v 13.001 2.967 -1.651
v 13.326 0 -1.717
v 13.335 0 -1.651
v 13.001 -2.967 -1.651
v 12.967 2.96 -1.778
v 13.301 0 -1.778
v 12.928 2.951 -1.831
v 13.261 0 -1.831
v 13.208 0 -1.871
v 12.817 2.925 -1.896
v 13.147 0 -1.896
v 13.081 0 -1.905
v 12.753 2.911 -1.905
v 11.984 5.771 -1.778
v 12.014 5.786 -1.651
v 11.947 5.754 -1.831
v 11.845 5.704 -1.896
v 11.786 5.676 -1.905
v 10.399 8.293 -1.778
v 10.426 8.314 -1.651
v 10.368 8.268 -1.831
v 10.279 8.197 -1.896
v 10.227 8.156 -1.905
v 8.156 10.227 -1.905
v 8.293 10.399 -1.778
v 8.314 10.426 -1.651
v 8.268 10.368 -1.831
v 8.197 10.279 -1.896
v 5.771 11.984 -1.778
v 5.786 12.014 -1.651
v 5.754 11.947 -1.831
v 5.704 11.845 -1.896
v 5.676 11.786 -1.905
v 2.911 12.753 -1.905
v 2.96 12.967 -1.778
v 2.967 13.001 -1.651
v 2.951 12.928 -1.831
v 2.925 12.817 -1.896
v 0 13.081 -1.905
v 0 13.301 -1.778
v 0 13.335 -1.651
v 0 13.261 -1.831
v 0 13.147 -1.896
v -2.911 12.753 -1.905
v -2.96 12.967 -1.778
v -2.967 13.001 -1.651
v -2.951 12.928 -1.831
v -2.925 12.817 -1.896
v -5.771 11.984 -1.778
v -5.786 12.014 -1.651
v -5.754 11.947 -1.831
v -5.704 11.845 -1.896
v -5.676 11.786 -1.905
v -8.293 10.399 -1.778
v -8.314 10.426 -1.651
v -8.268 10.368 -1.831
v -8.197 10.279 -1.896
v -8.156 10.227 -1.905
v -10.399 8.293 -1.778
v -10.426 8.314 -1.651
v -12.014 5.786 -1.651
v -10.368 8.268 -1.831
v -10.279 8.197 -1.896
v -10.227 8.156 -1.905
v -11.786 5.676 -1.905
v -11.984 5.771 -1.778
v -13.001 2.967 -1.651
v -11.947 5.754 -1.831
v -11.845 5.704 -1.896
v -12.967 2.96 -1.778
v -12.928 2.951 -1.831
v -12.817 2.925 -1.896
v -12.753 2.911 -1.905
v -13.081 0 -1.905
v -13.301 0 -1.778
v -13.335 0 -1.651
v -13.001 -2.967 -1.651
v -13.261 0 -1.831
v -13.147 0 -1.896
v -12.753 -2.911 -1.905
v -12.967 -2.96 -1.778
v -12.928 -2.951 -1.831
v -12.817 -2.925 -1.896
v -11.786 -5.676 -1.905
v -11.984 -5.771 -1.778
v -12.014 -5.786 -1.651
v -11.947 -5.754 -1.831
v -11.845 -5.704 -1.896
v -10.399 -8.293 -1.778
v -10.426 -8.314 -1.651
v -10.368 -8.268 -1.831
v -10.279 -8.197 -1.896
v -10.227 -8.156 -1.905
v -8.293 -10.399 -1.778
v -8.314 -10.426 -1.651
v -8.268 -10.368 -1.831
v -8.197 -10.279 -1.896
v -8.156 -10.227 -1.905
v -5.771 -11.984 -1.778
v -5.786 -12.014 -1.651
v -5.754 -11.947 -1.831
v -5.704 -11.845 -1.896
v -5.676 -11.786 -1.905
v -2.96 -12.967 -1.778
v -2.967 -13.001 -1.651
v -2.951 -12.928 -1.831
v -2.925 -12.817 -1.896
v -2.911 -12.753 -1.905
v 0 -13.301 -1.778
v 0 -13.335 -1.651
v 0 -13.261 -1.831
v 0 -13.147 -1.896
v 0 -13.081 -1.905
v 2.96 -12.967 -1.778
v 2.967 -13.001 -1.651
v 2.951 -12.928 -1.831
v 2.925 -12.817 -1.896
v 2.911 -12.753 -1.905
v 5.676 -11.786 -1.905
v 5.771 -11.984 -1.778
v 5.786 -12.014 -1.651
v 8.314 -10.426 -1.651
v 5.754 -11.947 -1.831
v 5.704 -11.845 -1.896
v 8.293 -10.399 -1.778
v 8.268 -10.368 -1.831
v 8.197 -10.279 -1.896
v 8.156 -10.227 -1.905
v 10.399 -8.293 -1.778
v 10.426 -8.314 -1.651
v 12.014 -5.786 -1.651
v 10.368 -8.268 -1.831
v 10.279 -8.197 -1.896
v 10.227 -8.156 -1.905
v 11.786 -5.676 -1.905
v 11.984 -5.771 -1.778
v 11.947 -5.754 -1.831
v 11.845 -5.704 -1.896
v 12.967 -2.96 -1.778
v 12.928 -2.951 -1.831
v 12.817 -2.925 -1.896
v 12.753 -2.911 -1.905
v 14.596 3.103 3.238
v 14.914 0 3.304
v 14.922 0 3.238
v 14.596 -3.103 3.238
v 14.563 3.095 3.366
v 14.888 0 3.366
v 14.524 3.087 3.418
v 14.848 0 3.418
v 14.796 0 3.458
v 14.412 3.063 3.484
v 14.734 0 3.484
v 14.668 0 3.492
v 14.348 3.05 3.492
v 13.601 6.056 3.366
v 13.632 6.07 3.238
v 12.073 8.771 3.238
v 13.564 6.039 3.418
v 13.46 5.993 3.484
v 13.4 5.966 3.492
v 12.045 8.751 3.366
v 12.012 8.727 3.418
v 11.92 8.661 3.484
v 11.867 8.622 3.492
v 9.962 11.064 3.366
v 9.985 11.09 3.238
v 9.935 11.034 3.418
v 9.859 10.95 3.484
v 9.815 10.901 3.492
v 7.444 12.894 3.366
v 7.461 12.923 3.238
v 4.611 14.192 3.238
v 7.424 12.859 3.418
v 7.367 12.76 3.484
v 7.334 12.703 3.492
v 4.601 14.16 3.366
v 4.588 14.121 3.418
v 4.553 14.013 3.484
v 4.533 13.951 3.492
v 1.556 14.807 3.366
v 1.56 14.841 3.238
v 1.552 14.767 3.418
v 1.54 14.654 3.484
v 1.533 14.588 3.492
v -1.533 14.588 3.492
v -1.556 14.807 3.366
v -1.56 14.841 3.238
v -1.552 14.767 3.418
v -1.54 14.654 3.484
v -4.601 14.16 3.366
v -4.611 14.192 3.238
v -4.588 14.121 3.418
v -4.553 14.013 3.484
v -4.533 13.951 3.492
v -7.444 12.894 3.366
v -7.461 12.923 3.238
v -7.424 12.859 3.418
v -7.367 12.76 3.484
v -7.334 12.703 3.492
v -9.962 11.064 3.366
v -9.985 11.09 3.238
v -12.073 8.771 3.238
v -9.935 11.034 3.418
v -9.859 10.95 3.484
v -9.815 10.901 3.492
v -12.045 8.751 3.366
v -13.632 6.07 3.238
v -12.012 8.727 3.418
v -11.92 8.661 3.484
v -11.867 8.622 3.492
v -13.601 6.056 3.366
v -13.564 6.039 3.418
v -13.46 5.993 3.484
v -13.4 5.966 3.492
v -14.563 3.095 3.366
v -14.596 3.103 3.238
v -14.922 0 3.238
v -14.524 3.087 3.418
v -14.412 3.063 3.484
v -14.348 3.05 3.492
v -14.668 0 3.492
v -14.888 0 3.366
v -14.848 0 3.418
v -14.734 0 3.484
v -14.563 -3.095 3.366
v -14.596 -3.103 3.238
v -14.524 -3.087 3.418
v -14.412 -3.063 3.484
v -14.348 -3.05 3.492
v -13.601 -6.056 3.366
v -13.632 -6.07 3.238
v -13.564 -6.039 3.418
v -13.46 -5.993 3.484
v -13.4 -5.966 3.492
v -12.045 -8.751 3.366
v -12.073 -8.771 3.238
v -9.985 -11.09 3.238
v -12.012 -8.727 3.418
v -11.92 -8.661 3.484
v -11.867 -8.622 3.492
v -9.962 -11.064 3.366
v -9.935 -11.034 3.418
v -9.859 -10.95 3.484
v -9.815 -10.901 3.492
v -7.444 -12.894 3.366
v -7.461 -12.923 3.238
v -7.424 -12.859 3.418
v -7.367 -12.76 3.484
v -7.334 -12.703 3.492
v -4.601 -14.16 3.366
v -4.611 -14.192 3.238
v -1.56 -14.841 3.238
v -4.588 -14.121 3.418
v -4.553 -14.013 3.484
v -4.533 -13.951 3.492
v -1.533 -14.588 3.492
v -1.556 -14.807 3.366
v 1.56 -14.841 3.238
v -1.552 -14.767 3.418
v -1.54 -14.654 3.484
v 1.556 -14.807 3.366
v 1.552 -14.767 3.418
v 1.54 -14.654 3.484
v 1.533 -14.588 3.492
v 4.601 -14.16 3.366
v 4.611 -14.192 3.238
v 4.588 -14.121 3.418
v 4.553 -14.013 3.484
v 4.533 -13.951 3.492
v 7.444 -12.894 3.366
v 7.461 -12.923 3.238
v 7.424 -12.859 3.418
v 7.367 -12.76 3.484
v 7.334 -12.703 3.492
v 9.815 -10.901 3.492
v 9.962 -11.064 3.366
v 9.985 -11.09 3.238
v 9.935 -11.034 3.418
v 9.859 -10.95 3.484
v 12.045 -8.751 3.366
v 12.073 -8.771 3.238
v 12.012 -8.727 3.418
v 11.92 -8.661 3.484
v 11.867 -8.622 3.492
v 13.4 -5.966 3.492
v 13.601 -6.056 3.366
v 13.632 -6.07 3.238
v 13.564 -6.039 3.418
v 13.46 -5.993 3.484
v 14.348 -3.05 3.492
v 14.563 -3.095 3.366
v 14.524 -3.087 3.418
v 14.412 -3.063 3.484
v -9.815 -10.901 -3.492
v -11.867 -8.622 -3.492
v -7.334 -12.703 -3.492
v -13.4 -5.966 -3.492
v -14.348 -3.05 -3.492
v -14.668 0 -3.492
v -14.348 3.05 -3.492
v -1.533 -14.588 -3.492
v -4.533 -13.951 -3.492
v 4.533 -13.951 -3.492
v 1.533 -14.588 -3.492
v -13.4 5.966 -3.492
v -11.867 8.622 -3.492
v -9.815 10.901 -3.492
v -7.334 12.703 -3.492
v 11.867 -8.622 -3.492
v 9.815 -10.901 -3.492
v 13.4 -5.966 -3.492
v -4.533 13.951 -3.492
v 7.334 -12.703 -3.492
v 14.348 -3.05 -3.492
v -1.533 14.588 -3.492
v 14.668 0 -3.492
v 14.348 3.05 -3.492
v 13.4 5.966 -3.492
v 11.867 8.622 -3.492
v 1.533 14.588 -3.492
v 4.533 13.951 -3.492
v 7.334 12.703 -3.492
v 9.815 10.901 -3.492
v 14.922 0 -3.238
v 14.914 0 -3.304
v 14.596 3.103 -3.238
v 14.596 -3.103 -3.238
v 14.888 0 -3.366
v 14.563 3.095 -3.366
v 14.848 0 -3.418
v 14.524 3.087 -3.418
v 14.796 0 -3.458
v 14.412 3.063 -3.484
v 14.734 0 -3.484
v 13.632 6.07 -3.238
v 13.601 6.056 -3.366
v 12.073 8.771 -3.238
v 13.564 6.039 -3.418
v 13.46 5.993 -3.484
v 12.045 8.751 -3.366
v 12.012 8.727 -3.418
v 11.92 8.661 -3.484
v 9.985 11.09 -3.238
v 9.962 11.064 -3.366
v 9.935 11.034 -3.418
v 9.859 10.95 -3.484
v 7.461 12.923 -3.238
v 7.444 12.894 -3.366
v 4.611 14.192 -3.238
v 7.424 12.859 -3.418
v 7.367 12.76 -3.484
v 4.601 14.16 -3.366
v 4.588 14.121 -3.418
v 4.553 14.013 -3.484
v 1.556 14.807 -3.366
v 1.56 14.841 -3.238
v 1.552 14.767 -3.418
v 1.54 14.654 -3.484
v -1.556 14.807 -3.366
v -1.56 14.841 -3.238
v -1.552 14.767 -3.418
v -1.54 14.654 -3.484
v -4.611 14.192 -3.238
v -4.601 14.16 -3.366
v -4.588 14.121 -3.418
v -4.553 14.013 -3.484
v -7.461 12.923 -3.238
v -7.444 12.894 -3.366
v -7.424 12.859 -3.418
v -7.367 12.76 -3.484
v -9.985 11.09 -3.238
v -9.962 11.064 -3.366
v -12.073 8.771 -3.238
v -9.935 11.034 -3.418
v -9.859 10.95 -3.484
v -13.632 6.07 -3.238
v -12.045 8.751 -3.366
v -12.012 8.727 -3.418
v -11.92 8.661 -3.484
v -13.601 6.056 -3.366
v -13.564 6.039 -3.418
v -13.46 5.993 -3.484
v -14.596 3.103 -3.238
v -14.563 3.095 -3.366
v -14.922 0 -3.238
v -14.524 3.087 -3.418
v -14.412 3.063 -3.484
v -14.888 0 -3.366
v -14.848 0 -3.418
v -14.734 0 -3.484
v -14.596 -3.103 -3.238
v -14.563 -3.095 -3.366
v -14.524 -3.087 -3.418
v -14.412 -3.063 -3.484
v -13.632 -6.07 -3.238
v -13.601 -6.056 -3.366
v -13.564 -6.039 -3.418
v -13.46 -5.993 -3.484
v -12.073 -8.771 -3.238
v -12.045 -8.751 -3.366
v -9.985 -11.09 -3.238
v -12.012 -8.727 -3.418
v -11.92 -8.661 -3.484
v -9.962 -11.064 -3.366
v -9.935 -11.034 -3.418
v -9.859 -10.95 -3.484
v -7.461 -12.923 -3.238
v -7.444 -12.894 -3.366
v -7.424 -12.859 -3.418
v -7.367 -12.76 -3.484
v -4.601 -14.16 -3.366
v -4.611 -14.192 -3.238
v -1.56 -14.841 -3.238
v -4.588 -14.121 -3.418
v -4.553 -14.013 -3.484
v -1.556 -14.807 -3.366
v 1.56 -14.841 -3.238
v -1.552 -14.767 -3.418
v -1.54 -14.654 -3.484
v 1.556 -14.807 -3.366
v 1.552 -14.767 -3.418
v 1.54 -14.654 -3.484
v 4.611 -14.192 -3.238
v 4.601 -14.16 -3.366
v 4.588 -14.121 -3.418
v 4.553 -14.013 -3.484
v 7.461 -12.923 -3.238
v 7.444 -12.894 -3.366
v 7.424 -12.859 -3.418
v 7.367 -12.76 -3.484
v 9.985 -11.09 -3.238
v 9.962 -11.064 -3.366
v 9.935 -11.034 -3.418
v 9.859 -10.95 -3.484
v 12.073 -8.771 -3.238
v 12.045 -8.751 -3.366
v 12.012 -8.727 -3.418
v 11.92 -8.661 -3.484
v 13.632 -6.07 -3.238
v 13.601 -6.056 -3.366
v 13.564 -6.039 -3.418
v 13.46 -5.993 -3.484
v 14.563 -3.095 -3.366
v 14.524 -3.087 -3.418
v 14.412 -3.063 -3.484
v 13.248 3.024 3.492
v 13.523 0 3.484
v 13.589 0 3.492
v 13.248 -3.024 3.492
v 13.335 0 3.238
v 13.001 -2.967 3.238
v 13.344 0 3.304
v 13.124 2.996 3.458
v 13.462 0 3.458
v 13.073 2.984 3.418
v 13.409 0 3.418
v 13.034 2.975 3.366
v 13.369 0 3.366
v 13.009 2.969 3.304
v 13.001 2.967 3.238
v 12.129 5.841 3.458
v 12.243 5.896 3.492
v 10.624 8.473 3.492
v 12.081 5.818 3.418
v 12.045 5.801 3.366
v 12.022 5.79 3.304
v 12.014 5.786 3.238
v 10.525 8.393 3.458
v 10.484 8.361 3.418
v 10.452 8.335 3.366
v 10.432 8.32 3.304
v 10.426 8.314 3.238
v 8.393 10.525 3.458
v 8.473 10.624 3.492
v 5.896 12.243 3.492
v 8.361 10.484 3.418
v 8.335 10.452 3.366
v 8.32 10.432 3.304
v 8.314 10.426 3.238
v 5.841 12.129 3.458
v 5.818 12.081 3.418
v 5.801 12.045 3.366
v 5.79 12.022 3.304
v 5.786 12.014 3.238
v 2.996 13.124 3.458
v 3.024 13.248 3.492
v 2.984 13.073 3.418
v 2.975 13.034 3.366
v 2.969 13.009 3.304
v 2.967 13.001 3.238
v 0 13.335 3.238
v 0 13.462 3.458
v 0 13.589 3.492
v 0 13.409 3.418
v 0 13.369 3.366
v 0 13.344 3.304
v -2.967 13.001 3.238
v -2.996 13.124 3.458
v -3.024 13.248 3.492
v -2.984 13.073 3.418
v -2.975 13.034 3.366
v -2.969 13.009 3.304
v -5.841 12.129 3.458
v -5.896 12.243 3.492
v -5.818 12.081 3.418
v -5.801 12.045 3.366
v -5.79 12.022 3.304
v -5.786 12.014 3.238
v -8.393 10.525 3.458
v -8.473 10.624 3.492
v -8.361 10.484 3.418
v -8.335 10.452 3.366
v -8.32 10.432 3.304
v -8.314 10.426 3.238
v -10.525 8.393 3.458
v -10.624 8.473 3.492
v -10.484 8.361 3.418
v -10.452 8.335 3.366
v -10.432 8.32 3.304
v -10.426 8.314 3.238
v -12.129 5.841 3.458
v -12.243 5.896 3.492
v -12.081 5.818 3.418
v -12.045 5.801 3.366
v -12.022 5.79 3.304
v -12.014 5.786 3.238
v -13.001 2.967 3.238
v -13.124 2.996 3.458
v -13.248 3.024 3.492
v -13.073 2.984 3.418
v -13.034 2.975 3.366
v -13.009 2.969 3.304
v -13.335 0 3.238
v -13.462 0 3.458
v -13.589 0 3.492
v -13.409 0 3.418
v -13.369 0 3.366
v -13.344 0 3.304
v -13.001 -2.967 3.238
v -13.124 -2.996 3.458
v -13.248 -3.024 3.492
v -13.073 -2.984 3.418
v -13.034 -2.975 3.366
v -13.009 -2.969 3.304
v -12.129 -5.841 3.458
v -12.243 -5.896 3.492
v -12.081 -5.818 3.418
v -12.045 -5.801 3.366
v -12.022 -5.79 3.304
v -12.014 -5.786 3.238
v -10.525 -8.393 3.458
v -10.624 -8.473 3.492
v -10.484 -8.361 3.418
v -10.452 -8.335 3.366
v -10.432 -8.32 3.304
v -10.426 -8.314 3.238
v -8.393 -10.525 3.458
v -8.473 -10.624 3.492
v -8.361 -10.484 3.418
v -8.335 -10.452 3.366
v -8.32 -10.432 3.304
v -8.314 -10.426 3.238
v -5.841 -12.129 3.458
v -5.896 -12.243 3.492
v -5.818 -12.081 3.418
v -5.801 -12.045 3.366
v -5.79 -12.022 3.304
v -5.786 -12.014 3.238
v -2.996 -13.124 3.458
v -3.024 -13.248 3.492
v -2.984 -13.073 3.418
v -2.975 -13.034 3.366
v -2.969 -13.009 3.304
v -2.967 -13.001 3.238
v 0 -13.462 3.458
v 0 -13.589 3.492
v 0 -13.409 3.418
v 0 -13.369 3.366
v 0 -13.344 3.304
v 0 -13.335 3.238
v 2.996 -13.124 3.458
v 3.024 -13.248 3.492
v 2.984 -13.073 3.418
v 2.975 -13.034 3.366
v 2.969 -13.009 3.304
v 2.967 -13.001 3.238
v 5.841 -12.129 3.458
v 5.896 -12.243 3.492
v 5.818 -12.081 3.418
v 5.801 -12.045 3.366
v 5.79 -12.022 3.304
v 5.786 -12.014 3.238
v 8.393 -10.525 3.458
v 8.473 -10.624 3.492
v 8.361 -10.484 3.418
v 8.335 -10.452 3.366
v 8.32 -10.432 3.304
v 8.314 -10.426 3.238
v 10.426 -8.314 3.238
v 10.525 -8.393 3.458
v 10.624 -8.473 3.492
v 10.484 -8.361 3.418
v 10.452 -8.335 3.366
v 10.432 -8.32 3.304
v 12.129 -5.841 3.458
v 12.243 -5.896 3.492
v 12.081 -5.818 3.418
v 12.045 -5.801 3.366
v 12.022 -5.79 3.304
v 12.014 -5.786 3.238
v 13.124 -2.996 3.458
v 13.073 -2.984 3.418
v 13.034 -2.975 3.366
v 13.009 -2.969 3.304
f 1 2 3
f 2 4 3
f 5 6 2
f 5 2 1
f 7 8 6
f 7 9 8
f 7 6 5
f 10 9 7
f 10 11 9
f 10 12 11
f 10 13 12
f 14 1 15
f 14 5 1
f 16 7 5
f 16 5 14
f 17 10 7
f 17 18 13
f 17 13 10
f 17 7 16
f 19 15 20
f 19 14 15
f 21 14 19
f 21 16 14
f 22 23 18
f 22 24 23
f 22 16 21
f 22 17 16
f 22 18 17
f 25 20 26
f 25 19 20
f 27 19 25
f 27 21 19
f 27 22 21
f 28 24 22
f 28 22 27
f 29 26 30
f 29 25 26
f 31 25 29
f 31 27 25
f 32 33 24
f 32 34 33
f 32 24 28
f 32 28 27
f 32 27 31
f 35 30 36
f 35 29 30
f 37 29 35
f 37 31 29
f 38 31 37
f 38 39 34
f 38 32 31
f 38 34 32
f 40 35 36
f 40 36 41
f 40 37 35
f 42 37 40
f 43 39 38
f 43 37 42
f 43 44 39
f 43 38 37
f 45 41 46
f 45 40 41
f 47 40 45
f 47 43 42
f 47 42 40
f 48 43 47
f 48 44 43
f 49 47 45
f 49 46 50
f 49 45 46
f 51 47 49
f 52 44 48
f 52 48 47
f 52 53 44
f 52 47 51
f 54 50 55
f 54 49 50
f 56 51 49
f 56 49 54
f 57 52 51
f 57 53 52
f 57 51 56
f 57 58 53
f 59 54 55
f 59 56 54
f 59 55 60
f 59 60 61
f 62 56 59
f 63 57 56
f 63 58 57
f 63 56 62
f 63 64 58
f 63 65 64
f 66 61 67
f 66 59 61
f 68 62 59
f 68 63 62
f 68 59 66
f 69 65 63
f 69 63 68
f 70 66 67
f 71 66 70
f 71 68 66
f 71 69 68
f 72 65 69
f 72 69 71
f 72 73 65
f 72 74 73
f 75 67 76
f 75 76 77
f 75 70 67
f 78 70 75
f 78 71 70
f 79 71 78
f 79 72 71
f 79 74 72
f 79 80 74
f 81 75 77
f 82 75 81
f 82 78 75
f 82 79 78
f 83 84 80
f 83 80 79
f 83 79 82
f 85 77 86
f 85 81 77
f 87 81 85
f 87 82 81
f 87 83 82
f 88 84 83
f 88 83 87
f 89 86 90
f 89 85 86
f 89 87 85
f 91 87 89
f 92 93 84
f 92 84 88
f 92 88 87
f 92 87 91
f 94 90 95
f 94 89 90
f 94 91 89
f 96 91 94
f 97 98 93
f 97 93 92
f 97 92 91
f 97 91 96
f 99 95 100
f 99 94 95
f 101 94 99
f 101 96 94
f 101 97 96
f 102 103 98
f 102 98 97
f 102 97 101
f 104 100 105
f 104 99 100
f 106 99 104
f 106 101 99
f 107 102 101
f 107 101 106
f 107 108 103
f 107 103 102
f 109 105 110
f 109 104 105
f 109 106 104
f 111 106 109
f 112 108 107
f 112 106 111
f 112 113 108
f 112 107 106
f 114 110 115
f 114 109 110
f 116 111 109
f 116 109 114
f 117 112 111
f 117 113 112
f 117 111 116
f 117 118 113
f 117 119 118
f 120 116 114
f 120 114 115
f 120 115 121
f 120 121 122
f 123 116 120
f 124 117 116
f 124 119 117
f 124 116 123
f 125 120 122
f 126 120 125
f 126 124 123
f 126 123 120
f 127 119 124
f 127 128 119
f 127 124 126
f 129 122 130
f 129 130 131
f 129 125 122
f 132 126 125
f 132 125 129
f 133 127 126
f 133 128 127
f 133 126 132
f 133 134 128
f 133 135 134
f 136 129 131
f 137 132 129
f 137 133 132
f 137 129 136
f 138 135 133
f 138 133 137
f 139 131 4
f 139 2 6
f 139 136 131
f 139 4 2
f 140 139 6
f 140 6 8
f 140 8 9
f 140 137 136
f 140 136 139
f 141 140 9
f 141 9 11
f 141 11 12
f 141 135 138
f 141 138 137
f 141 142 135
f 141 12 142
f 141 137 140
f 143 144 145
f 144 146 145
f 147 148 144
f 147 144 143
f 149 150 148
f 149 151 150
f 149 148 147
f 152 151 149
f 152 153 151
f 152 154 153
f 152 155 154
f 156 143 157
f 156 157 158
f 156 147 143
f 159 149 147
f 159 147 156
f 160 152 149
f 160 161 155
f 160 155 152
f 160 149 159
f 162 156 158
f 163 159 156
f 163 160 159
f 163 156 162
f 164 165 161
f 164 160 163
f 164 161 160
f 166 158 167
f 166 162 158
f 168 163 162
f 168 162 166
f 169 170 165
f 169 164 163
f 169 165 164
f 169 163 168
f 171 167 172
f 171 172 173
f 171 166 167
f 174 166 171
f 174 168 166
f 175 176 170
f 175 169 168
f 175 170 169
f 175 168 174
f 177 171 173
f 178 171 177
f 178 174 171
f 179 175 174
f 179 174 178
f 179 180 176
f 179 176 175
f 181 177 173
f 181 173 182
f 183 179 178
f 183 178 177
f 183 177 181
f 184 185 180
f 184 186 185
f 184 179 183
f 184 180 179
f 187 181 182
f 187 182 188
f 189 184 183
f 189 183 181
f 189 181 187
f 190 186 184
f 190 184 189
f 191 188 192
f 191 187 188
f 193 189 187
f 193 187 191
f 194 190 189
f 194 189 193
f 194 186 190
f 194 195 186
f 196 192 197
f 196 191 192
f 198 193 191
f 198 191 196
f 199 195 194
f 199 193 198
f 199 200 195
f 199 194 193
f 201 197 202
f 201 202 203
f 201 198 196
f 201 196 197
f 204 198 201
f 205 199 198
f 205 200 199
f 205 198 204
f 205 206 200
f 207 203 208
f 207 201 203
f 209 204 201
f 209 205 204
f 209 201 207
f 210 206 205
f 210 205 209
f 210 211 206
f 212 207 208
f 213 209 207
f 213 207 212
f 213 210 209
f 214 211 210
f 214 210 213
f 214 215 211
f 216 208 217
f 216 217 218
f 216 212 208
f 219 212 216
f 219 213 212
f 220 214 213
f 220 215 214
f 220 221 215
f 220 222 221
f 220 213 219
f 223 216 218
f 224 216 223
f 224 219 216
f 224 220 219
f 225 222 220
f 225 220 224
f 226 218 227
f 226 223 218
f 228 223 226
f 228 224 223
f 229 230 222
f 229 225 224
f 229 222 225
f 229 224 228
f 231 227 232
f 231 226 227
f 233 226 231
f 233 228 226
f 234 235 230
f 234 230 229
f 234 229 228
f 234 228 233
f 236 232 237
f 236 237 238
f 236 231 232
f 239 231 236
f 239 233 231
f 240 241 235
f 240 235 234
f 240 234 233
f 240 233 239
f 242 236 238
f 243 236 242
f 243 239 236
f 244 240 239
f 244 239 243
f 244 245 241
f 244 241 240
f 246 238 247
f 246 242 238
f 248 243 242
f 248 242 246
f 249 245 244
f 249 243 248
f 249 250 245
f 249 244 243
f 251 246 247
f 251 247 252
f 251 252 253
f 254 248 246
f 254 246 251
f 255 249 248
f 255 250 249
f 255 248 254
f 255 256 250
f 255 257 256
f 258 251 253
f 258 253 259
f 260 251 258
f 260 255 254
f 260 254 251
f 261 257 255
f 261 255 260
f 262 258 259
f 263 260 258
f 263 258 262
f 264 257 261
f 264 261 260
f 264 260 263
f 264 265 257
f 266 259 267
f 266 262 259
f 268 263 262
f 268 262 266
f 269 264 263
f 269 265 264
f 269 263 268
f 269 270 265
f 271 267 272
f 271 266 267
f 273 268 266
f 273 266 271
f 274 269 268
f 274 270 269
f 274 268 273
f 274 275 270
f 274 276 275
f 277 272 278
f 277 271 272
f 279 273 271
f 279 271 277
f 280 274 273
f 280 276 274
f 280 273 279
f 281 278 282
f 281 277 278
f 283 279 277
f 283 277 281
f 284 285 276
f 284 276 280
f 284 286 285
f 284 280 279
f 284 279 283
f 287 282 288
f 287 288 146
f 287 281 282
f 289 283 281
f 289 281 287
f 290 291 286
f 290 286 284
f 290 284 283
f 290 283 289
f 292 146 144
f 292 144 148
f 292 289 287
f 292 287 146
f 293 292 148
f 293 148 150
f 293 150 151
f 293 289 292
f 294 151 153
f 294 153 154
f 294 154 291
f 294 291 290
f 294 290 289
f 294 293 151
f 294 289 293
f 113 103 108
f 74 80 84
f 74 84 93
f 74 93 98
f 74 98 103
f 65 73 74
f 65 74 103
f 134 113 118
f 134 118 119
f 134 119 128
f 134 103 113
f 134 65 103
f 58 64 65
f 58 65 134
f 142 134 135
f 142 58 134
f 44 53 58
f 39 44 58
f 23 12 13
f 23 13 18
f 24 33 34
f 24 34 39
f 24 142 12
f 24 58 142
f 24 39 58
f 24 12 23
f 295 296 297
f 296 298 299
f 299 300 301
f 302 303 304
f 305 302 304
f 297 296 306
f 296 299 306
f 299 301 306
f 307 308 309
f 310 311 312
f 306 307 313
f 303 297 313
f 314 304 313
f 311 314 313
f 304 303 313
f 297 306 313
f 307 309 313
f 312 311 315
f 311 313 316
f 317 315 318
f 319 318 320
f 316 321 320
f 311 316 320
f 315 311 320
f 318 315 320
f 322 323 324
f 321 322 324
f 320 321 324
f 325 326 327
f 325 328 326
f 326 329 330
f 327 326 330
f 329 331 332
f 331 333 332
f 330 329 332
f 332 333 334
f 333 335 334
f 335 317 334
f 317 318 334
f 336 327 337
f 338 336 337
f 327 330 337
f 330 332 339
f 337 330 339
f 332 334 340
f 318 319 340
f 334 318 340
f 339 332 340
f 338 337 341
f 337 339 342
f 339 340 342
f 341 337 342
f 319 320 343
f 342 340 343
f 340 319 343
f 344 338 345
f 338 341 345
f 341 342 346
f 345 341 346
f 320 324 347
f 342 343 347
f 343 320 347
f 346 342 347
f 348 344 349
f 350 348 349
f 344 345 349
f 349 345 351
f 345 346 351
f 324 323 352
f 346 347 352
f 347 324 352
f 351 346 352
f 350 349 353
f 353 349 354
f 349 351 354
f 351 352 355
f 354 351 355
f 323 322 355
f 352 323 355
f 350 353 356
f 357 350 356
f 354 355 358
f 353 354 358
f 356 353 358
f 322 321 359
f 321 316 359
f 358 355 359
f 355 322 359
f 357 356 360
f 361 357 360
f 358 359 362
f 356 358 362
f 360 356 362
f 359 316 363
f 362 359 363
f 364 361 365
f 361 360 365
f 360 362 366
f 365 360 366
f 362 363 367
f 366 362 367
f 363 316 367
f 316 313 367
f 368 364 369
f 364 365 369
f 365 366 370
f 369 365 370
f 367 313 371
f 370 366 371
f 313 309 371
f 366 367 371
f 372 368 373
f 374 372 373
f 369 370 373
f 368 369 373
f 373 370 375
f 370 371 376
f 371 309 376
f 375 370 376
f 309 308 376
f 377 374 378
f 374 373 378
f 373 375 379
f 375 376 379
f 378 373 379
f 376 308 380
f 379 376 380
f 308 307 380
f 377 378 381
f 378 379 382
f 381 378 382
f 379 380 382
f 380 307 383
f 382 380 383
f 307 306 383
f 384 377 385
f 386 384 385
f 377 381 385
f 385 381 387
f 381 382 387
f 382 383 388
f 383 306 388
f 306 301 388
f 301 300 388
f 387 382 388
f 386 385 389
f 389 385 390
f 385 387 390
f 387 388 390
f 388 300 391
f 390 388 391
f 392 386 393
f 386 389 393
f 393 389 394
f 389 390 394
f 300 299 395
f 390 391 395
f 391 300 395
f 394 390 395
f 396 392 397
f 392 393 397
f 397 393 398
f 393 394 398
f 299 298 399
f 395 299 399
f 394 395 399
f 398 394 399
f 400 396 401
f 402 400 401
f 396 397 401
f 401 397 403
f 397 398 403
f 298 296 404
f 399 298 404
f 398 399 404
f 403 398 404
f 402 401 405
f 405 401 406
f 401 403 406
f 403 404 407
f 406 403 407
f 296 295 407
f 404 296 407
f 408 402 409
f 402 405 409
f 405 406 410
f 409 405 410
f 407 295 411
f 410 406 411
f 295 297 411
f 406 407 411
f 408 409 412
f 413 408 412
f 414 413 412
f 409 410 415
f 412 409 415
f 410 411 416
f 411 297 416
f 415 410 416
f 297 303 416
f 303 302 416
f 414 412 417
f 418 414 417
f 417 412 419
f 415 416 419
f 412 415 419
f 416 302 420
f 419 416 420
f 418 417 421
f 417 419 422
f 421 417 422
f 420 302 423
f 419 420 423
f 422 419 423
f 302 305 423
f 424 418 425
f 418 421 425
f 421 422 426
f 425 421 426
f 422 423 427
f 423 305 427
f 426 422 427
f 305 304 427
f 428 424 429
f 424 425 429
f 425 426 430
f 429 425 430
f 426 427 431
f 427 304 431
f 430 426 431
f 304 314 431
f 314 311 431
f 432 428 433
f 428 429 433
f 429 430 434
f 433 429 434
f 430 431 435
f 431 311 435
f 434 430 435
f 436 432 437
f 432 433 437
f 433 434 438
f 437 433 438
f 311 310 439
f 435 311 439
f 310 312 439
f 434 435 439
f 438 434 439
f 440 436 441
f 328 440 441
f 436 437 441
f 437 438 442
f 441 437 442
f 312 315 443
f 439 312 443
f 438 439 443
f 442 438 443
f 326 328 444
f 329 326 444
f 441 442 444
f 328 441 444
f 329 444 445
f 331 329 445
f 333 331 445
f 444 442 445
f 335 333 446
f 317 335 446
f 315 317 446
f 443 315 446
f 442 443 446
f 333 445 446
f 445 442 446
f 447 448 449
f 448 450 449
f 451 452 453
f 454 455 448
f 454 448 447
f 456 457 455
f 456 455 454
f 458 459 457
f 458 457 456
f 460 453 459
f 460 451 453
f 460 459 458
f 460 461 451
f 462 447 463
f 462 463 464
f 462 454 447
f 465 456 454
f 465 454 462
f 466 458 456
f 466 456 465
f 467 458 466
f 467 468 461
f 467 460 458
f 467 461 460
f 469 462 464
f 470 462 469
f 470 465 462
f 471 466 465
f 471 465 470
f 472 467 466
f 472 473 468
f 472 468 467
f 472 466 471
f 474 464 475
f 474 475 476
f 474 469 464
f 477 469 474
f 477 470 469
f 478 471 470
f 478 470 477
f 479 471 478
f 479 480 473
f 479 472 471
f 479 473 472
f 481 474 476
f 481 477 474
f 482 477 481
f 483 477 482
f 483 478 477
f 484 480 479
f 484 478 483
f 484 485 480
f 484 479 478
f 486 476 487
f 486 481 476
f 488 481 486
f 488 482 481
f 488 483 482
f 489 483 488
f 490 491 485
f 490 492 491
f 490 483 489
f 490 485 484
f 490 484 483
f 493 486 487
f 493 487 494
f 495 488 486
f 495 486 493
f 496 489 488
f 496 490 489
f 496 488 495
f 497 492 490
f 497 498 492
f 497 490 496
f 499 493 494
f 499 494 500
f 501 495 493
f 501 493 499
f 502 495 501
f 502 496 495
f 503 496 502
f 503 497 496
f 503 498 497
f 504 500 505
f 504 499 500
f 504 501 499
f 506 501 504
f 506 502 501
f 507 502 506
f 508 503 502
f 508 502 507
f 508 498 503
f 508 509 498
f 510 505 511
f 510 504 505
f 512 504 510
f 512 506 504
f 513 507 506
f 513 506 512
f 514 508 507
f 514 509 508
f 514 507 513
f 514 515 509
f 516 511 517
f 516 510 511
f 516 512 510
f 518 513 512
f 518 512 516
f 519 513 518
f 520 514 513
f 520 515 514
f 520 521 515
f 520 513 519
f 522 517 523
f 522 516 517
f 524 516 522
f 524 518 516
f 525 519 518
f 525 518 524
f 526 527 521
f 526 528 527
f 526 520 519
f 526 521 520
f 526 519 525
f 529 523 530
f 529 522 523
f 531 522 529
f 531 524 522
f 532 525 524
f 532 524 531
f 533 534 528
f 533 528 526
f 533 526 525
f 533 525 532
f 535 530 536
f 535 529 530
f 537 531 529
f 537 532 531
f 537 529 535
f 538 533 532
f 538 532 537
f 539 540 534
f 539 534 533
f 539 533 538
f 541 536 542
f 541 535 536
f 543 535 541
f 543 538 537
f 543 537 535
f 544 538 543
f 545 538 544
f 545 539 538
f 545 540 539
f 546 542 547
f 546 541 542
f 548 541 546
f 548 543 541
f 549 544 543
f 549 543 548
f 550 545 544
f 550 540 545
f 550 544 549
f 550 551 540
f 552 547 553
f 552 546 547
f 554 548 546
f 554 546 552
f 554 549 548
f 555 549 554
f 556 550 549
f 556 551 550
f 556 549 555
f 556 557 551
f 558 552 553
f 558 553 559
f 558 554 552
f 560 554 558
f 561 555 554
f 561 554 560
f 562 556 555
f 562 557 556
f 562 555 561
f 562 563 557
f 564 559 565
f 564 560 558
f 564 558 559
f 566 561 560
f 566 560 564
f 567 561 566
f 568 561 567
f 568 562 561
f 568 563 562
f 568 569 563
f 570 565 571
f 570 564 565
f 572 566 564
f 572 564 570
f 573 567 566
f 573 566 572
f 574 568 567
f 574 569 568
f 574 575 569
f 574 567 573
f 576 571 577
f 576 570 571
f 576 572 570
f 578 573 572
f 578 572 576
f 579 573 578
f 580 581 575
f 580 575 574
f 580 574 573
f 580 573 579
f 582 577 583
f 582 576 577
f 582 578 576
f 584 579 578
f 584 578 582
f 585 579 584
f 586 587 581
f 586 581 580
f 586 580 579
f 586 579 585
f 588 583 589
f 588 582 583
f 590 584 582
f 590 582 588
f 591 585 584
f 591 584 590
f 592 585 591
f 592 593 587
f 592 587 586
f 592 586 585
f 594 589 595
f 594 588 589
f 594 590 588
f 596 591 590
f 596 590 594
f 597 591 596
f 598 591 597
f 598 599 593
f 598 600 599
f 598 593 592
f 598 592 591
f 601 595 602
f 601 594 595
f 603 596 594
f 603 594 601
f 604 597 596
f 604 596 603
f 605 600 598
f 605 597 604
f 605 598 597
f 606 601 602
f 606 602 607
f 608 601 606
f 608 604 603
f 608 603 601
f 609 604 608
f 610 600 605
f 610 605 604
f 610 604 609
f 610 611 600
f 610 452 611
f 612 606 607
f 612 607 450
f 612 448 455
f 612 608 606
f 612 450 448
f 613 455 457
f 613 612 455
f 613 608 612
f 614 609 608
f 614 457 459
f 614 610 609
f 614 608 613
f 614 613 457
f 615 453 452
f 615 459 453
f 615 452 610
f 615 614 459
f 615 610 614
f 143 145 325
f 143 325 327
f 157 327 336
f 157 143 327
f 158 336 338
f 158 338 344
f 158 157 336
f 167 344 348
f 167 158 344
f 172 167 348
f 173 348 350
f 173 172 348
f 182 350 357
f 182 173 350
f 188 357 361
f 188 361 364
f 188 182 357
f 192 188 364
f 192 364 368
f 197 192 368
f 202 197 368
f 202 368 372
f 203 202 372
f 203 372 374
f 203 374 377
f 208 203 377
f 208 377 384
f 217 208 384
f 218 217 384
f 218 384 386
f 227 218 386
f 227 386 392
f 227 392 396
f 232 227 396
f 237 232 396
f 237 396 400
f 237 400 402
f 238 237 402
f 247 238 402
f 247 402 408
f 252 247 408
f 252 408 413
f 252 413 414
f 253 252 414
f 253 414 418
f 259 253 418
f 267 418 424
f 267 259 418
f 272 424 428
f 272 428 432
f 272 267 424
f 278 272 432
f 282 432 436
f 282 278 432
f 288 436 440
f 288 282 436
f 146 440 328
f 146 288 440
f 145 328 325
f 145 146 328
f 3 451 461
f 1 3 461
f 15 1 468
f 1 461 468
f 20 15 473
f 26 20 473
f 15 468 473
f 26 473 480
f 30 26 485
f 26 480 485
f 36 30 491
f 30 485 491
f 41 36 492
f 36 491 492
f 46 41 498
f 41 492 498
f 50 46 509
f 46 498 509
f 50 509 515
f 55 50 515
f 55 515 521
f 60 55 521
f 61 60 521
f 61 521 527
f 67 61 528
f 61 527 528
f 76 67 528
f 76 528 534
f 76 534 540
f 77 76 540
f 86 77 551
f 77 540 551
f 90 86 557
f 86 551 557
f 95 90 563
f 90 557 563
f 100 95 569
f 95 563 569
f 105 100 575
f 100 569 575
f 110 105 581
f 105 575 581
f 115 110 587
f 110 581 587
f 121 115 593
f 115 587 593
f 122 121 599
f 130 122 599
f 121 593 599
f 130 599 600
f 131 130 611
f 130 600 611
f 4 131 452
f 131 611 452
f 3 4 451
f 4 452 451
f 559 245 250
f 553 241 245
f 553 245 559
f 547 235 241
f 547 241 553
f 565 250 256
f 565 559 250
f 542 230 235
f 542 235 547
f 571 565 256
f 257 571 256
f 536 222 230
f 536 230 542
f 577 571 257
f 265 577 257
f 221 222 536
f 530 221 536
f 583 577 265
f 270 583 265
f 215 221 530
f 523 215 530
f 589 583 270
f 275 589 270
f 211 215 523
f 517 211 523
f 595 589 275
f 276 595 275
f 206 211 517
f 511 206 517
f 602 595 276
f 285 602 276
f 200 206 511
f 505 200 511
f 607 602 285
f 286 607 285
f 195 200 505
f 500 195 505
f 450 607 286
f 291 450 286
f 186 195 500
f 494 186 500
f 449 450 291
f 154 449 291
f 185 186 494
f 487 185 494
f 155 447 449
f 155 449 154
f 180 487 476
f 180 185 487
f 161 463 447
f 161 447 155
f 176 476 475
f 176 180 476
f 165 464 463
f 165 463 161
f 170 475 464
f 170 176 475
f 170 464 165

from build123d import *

# Parameters (mm, degrees)
F0_R     = 14.9225
F1_DEPTH = 3.4925
F2_T     = -1.5875
F3_R     = 0.254


with BuildPart() as f1:
    # F0 (on Top) → F1 (new body, symmetric)
    with BuildSketch(Plane.XY):
        Circle(F0_R)
    extrude(amount=F1_DEPTH, both=True)

    # F2
    f2_openings = [f1.faces().sort_by_distance(p)[0] for p in [
        (0, 0, 3.4925),
    ]]
    offset(amount=F2_T, openings=f2_openings)

    # F3
    f3_edges = [f1.edges().sort_by_distance(p)[0] for p in [
        (-13.335, 0, -1.905),
        (-13.335, 0, 3.4925),
        (-14.9225, 0, 3.4925),
        (-14.9225, 0, -3.4925),
    ]]
    fillet(f3_edges, radius=F3_R)


solid = f1.part
